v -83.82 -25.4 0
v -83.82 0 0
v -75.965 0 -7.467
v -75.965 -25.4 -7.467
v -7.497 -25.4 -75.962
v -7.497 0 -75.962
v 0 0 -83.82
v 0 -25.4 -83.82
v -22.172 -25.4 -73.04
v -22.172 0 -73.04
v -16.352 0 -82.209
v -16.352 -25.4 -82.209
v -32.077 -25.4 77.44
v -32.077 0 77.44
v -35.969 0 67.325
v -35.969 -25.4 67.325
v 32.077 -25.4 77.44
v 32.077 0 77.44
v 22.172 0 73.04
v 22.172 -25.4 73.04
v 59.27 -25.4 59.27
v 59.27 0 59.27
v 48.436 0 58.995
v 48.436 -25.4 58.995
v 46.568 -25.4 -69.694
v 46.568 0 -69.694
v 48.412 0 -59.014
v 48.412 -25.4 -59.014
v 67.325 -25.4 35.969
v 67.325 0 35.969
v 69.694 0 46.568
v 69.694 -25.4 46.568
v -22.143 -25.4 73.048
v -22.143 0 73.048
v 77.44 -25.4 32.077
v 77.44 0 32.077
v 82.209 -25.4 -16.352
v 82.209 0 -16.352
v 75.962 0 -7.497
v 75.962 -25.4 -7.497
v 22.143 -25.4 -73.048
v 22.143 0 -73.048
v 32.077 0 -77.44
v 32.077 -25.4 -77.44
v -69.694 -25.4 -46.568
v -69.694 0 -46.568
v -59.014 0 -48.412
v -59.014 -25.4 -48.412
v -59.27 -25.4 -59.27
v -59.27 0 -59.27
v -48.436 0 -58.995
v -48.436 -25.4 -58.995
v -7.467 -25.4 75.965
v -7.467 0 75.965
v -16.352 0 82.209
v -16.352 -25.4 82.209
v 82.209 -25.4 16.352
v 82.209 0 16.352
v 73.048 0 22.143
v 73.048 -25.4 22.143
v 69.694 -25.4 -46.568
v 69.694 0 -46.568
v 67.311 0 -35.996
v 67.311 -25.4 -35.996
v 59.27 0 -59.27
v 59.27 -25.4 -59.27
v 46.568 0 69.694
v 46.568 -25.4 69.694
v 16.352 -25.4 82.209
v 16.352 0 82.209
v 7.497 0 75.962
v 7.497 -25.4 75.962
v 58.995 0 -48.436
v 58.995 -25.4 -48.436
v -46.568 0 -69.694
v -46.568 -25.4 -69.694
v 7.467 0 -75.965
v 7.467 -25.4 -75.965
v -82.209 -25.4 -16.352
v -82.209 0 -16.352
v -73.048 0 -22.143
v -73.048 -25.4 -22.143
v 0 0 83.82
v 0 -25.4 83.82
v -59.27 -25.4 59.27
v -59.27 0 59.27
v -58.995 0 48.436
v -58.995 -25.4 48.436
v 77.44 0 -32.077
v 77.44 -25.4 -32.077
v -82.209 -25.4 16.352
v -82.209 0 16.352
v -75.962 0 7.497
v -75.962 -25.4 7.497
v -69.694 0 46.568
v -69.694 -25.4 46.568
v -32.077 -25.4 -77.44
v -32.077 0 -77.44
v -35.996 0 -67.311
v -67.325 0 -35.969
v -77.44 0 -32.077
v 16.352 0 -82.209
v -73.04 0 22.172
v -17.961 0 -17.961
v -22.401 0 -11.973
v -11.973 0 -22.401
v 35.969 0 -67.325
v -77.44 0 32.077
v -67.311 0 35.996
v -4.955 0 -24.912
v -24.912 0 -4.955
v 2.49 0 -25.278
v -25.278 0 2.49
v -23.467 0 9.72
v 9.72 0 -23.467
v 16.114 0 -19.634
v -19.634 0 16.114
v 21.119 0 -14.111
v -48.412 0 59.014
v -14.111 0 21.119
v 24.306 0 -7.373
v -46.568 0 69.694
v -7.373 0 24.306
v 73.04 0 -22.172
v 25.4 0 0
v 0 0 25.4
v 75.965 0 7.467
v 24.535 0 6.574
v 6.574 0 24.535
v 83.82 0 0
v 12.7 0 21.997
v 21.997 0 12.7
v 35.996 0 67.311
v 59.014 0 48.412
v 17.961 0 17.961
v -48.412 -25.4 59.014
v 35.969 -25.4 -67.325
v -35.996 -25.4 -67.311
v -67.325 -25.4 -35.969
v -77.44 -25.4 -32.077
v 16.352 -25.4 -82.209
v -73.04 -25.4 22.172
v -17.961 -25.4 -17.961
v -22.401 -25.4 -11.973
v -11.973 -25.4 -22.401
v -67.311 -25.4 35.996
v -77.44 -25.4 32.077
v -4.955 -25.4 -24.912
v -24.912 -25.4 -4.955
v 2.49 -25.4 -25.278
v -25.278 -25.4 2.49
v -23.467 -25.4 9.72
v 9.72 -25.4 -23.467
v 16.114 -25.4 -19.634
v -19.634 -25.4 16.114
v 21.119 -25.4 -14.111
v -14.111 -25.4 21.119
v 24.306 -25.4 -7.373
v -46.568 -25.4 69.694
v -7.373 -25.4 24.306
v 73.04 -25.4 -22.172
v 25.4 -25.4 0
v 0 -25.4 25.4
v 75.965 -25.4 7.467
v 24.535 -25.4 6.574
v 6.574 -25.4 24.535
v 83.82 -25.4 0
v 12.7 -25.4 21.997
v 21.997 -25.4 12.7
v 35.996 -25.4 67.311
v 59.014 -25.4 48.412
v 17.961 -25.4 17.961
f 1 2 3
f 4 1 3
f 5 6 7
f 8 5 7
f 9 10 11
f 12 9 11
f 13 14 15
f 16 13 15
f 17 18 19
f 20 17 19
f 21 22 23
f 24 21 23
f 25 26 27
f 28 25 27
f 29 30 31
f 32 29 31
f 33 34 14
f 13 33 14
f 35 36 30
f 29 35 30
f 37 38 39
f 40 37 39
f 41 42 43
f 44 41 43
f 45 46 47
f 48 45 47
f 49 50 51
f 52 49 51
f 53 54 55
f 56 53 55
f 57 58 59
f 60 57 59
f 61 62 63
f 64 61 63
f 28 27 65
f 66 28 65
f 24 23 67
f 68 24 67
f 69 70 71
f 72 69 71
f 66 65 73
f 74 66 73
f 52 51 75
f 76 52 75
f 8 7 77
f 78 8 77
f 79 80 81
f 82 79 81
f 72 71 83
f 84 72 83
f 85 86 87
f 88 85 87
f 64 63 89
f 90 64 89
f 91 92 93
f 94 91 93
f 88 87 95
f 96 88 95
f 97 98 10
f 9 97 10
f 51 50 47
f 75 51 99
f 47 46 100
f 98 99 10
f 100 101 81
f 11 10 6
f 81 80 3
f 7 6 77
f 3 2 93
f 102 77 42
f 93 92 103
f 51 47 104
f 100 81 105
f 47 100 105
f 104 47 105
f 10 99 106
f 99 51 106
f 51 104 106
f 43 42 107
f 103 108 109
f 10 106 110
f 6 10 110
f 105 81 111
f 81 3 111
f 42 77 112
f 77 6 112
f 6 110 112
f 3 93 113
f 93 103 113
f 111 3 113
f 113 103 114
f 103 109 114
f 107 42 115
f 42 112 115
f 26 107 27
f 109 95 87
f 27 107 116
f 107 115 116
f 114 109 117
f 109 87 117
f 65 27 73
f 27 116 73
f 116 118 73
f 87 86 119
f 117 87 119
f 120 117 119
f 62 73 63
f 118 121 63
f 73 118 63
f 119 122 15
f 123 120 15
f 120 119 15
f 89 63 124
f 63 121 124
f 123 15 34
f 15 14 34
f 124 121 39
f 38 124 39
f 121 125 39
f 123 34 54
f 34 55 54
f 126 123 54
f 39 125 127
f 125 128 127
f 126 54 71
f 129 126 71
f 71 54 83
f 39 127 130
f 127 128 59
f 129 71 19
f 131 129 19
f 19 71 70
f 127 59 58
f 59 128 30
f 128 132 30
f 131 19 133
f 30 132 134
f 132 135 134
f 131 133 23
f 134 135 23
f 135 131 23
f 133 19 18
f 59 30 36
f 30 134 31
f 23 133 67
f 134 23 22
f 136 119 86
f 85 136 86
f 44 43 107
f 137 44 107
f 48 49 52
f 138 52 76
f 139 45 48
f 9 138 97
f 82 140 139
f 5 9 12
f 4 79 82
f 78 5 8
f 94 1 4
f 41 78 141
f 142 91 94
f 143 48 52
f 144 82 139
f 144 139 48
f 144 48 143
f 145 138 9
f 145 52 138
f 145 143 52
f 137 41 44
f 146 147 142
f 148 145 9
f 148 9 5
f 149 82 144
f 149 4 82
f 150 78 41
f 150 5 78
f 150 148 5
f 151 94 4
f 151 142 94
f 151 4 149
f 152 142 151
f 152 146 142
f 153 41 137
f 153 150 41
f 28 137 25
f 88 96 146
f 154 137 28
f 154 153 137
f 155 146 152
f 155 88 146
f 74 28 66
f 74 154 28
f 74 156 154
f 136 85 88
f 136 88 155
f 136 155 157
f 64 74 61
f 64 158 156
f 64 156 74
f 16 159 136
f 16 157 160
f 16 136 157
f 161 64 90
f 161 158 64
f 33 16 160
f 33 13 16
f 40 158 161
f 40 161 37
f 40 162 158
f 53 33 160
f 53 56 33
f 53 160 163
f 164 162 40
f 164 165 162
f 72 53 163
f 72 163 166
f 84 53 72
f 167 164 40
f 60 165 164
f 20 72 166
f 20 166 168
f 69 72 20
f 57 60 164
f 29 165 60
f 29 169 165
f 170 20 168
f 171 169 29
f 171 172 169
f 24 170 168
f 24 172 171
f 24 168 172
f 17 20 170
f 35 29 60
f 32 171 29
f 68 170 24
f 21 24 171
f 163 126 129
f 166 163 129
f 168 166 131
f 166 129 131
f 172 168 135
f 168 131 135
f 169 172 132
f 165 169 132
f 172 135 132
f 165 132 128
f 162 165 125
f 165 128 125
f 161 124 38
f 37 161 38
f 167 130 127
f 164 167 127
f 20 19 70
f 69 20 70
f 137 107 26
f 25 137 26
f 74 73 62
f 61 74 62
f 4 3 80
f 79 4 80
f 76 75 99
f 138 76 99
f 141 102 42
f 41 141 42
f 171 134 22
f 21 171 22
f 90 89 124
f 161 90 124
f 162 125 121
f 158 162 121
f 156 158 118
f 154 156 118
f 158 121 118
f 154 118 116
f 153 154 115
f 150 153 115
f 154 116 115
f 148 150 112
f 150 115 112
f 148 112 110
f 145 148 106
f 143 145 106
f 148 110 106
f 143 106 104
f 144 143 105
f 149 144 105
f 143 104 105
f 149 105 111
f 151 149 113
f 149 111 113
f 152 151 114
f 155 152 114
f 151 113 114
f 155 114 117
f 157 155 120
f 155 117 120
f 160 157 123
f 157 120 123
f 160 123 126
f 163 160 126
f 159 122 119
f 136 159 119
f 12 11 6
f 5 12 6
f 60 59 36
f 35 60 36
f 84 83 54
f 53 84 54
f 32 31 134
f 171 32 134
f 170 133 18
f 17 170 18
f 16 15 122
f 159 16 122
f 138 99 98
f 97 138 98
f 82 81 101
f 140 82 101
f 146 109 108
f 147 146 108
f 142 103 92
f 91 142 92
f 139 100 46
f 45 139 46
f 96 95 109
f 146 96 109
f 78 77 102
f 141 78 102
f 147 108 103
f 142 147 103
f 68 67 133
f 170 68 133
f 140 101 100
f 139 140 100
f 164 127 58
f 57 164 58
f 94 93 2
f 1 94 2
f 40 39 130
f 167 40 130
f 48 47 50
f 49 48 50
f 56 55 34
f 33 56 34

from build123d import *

# Parameters (mm, degrees)
F1_DEPTH = 25.4
F2_DEPTH = 25.4


with BuildPart() as f1:
    # F0 (on Front) → F1 (new body)
    with BuildSketch(Plane.XZ):
        with BuildLine():
            ThreePointArc((75.8463119216, -7.333278114), (76.1115266186, -3.6709012229), (76.2, 0))
            ThreePointArc((76.2, 0), (76.1122749967, 3.6553515317), (75.8493019732, 7.3022866401))
            ThreePointArc((75.8493019732, 7.3022866401), (75.8346004903, 7.4534132101), (75.8195978942, 7.6045101852))
            ThreePointArc((75.8195978942, 7.6045101852), (74.7388739127, 14.8506136664), (72.9672734521, 21.9594399966))
            ThreePointArc((72.9672734521, 21.9594399966), (72.9233711228, 22.1047945949), (72.87917924, 22.2500614226))
            ThreePointArc((72.87917924, 22.2500614226), (70.4055764051, 29.1460942677), (67.2811535328, 35.7727043889))
            ThreePointArc((67.2811535328, 35.7727043889), (67.209737499, 35.9067011198), (67.1380545986, 36.0405552776))
            ThreePointArc((67.1380545986, 36.0405552776), (63.3666320803, 42.3215068116), (59.0094566149, 48.2112438132))
            ThreePointArc((59.0094566149, 48.2112438132), (58.9132713548, 48.3287332575), (58.8168521705, 48.446030805))
            ThreePointArc((58.8168521705, 48.446030805), (53.892543621, 53.8705275829), (48.4700593721, 58.7970521749))
            ThreePointArc((48.4700593721, 58.7970521749), (48.3528012314, 58.8935192791), (48.2353510983, 58.9897525374))
            ThreePointArc((48.2353510983, 58.9897525374), (42.3473949336, 63.3493341902), (36.0679849301, 67.1233227953))
            ThreePointArc((36.0679849301, 67.1233227953), (35.9341600732, 67.1950603827), (35.8001925341, 67.2665311616))
            ThreePointArc((35.8001925341, 67.2665311616), (29.1748596076, 70.3936614112), (22.2798380543, 72.8700817639))
            ThreePointArc((22.2798380543, 72.8700817639), (22.1345892955, 72.9143329992), (21.9892526478, 72.9582947168))
            ThreePointArc((21.9892526478, 72.9582947168), (14.8811507884, 74.7327997014), (7.6354894968, 75.8164843563))
            ThreePointArc((7.6354894968, 75.8164843563), (7.4843986644, 75.8315486894), (7.333278114, 75.8463119216))
            ThreePointArc((7.333278114, 75.8463119216), (3.6709012229, 76.1115266186), (0, 76.2))
            ThreePointArc((0, 76.2), (-3.6553515317, 76.1122749967), (-7.3022866401, 75.8493019732))
            ThreePointArc((-7.3022866401, 75.8493019732), (-7.4534132101, 75.8346004903), (-7.6045101852, 75.8195978942))
            ThreePointArc((-7.6045101852, 75.8195978942), (-14.8506136664, 74.7388739127), (-21.9594399966, 72.9672734521))
            ThreePointArc((-21.9594399966, 72.9672734521), (-22.1047945949, 72.9233711228), (-22.2500614226, 72.87917924))
            ThreePointArc((-22.2500614226, 72.87917924), (-29.1460942677, 70.4055764051), (-35.7727043889, 67.2811535328))
            ThreePointArc((-35.7727043889, 67.2811535328), (-35.9067011198, 67.209737499), (-36.0405552776, 67.1380545986))
            ThreePointArc((-36.0405552776, 67.1380545986), (-42.3215068116, 63.3666320803), (-48.2112438132, 59.0094566149))
            ThreePointArc((-48.2112438132, 59.0094566149), (-48.3287332575, 58.9132713548), (-48.446030805, 58.8168521705))
            ThreePointArc((-48.446030805, 58.8168521705), (-53.8705275829, 53.892543621), (-58.7970521749, 48.4700593721))
            ThreePointArc((-58.7970521749, 48.4700593721), (-58.8935192791, 48.3528012314), (-58.9897525374, 48.2353510983))
            ThreePointArc((-58.9897525374, 48.2353510983), (-63.3493341902, 42.3473949336), (-67.1233227953, 36.0679849301))
            ThreePointArc((-67.1233227953, 36.0679849301), (-67.1950603827, 35.9341600732), (-67.2665311616, 35.8001925341))
            ThreePointArc((-67.2665311616, 35.8001925341), (-70.3936614112, 29.1748596076), (-72.8700817639, 22.2798380543))
            ThreePointArc((-72.8700817639, 22.2798380543), (-72.9143329992, 22.1345892955), (-72.9582947168, 21.9892526478))
            ThreePointArc((-72.9582947168, 21.9892526478), (-74.7327997014, 14.8811507884), (-75.8164843563, 7.6354894968))
            ThreePointArc((-75.8164843563, 7.6354894968), (-75.8315486894, 7.4843986644), (-75.8463119216, 7.333278114))
            ThreePointArc((-75.8463119216, 7.333278114), (-76.1999984098, 0.0155676898), (-75.8493019732, -7.3022866401))
            ThreePointArc((-75.8493019732, -7.3022866401), (-75.8346004903, -7.4534132101), (-75.8195978942, -7.6045101852))
            ThreePointArc((-75.8195978942, -7.6045101852), (-74.7388739127, -14.8506136664), (-72.9672734521, -21.9594399966))
            ThreePointArc((-72.9672734521, -21.9594399966), (-72.9233711228, -22.1047945949), (-72.87917924, -22.2500614226))
            ThreePointArc((-72.87917924, -22.2500614226), (-70.4055764051, -29.1460942677), (-67.2811535328, -35.7727043889))
            ThreePointArc((-67.2811535328, -35.7727043889), (-67.209737499, -35.9067011198), (-67.1380545986, -36.0405552776))
            ThreePointArc((-67.1380545986, -36.0405552776), (-63.3666320803, -42.3215068116), (-59.0094566149, -48.2112438132))
            ThreePointArc((-59.0094566149, -48.2112438132), (-58.9132713548, -48.3287332575), (-58.8168521705, -48.446030805))
            ThreePointArc((-58.8168521705, -48.446030805), (-53.892543621, -53.8705275829), (-48.4700593721, -58.7970521749))
            ThreePointArc((-48.4700593721, -58.7970521749), (-48.3528012314, -58.8935192791), (-48.2353510983, -58.9897525374))
            ThreePointArc((-48.2353510983, -58.9897525374), (-42.3473949336, -63.3493341902), (-36.0679849301, -67.1233227953))
            ThreePointArc((-36.0679849301, -67.1233227953), (-35.9341600732, -67.1950603827), (-35.8001925341, -67.2665311616))
            ThreePointArc((-35.8001925341, -67.2665311616), (-29.1748596076, -70.3936614112), (-22.2798380543, -72.8700817639))
            ThreePointArc((-22.2798380543, -72.8700817639), (-22.1345892955, -72.9143329992), (-21.9892526478, -72.9582947168))
            ThreePointArc((-21.9892526478, -72.9582947168), (-14.8811507884, -74.7327997014), (-7.6354894968, -75.8164843563))
            ThreePointArc((-7.6354894968, -75.8164843563), (-7.4843986644, -75.8315486894), (-7.333278114, -75.8463119216))
            ThreePointArc((-7.333278114, -75.8463119216), (-0.0155676898, -76.1999984098), (7.3022866401, -75.8493019732))
            ThreePointArc((7.3022866401, -75.8493019732), (7.4534132101, -75.8346004903), (7.6045101852, -75.8195978942))
            ThreePointArc((7.6045101852, -75.8195978942), (14.8506136664, -74.7388739127), (21.9594399966, -72.9672734521))
            ThreePointArc((21.9594399966, -72.9672734521), (22.1047945949, -72.9233711228), (22.2500614226, -72.87917924))
            ThreePointArc((22.2500614226, -72.87917924), (29.1460942677, -70.4055764051), (35.7727043889, -67.2811535328))
            ThreePointArc((35.7727043889, -67.2811535328), (35.9067011198, -67.209737499), (36.0405552776, -67.1380545986))
            ThreePointArc((36.0405552776, -67.1380545986), (42.3215068116, -63.3666320803), (48.2112438132, -59.0094566149))
            ThreePointArc((48.2112438132, -59.0094566149), (48.3287332575, -58.9132713548), (48.446030805, -58.8168521705))
            ThreePointArc((48.446030805, -58.8168521705), (53.8705275829, -53.892543621), (58.7970521749, -48.4700593721))
            ThreePointArc((58.7970521749, -48.4700593721), (58.8935192791, -48.3528012314), (58.9897525374, -48.2353510983))
            ThreePointArc((58.9897525374, -48.2353510983), (63.3493341902, -42.3473949336), (67.1233227953, -36.0679849301))
            ThreePointArc((67.1233227953, -36.0679849301), (67.1950603827, -35.9341600732), (67.2665311616, -35.8001925341))
            ThreePointArc((67.2665311616, -35.8001925341), (70.3936614112, -29.1748596076), (72.8700817639, -22.2798380543))
            ThreePointArc((72.8700817639, -22.2798380543), (72.9143329992, -22.1345892955), (72.9582947168, -21.9892526478))
            ThreePointArc((72.9582947168, -21.9892526478), (74.7327997014, -14.8811507884), (75.8164843563, -7.6354894968))
            ThreePointArc((75.8164843563, -7.6354894968), (75.8315486894, -7.4843986644), (75.8463119216, -7.333278114))
        make_face()
        with BuildLine():
            ThreePointArc((25.4, 0), (-17.9605122421, -17.9605122421), (0, 25.4))
            ThreePointArc((0, 25.4), (17.9605122421, 17.9605122421), (25.4, 0))
        make_face(mode=Mode.SUBTRACT)
    extrude(amount=F1_DEPTH)

    # F0 (on Front) → F2 (join)
    with BuildSketch(Plane.XZ):
        with BuildLine():
            ThreePointArc((75.8493019732, 7.3022866401), (76.1122749967, 3.6553515317), (76.2, 0))
            ThreePointArc((76.2, 0), (76.1115266186, -3.6709012229), (75.8463119216, -7.333278114))
            Line((75.8463119216, -7.333278114), (75.9617505843, -7.4969030545))
            Line((75.9617505843, -7.4969030545), (83.82, 0))
            Line((83.82, 0), (75.9647400778, 7.4665502179))
            Line((75.9647400778, 7.4665502179), (75.8493019732, 7.3022866401))
        make_face()
        with BuildLine():
            ThreePointArc((75.8195978942, 7.6045101852), (75.8346004903, 7.4534132101), (75.8493019732, 7.3022866401))
            Line((75.8493019732, 7.3022866401), (75.9647400778, 7.4665502179))
            Line((75.9647400778, 7.4665502179), (75.8195978942, 7.6045101852))
        make_face()
        with BuildLine():
            Line((75.9617505843, -7.4969030545), (75.8463119216, -7.333278114))
            ThreePointArc((75.8463119216, -7.333278114), (75.8315486894, -7.4843986644), (75.8164843563, -7.6354894968))
            Line((75.8164843563, -7.6354894968), (75.9617505843, -7.4969030545))
        make_face()
        with BuildLine():
            ThreePointArc((72.9672734521, 21.9594399966), (74.7388739127, 14.8506136664), (75.8195978942, 7.6045101852))
            Line((75.8195978942, 7.6045101852), (75.9647400778, 7.4665502179))
            Line((75.9647400778, 7.4665502179), (82.2094222034, 16.3524707914))
            Line((82.2094222034, 16.3524707914), (73.0484472116, 22.1430681527))
            Line((73.0484472116, 22.1430681527), (72.9672734521, 21.9594399966))
        make_face()
        with BuildLine():
            Line((75.9617505843, -7.4969030545), (75.8164843563, -7.6354894968))
            ThreePointArc((75.8164843563, -7.6354894968), (74.7327997014, -14.8811507884), (72.9582947168, -21.9892526478))
            Line((72.9582947168, -21.9892526478), (73.0395936157, -22.1722545469))
            Line((73.0395936157, -22.1722545469), (82.2094222034, -16.3524707914))
            Line((82.2094222034, -16.3524707914), (75.9617505843, -7.4969030545))
        make_face()
        with BuildLine():
            ThreePointArc((72.87917924, 22.2500614226), (72.9233711228, 22.1047945949), (72.9672734521, 21.9594399966))
            Line((72.9672734521, 21.9594399966), (73.0484472116, 22.1430681527))
            Line((73.0484472116, 22.1430681527), (72.87917924, 22.2500614226))
        make_face()
        with BuildLine():
            Line((73.0395936157, -22.1722545469), (72.9582947168, -21.9892526478))
            ThreePointArc((72.9582947168, -21.9892526478), (72.9143329992, -22.1345892955), (72.8700817639, -22.2798380543))
            Line((72.8700817639, -22.2798380543), (73.0395936157, -22.1722545469))
        make_face()
        with BuildLine():
            ThreePointArc((67.2811535328, 35.7727043889), (70.4055764051, 29.1460942677), (72.87917924, 22.2500614226))
            Line((72.87917924, 22.2500614226), (73.0484472116, 22.1430681527))
            Line((73.0484472116, 22.1430681527), (77.4395824151, 32.0765253008))
            Line((77.4395824151, 32.0765253008), (67.3249434851, 35.9686403965))
            Line((67.3249434851, 35.9686403965), (67.2811535328, 35.7727043889))
        make_face()
        with BuildLine():
            Line((73.0395936157, -22.1722545469), (72.8700817639, -22.2798380543))
            ThreePointArc((72.8700817639, -22.2798380543), (70.3936614112, -29.1748596076), (67.2665311616, -35.8001925341))
            Line((67.2665311616, -35.8001925341), (67.3105660255, -35.9955387314))
            Line((67.3105660255, -35.9955387314), (77.4395824151, -32.0765253008))
            Line((77.4395824151, -32.0765253008), (73.0395936157, -22.1722545469))
        make_face()
        with BuildLine():
            ThreePointArc((67.1380545986, 36.0405552776), (67.209737499, 35.9067011198), (67.2811535328, 35.7727043889))
            Line((67.2811535328, 35.7727043889), (67.3249434851, 35.9686403965))
            Line((67.3249434851, 35.9686403965), (67.1380545986, 36.0405552776))
        make_face()
        with BuildLine():
            Line((67.3105660255, -35.9955387314), (67.2665311616, -35.8001925341))
            ThreePointArc((67.2665311616, -35.8001925341), (67.1950603827, -35.9341600732), (67.1233227953, -36.0679849301))
            Line((67.1233227953, -36.0679849301), (67.3105660255, -35.9955387314))
        make_face()
        with BuildLine():
            ThreePointArc((59.0094566149, 48.2112438132), (63.3666320803, 42.3215068116), (67.1380545986, 36.0405552776))
            Line((67.1380545986, 36.0405552776), (67.3249434851, 35.9686403965))
            Line((67.3249434851, 35.9686403965), (69.6937829032, 46.5678969317))
            Line((69.6937829032, 46.5678969317), (59.0141799367, 48.4119579612))
            Line((59.0141799367, 48.4119579612), (59.0094566149, 48.2112438132))
        make_face()
        with BuildLine():
            Line((67.3105660255, -35.9955387314), (67.1233227953, -36.0679849301))
            ThreePointArc((67.1233227953, -36.0679849301), (63.3493341902, -42.3473949336), (58.9897525374, -48.2353510983))
            Line((58.9897525374, -48.2353510983), (58.9948311312, -48.4355345489))
            Line((58.9948311312, -48.4355345489), (69.6937829032, -46.5678969317))
            Line((69.6937829032, -46.5678969317), (67.3105660255, -35.9955387314))
        make_face()
        with BuildLine():
            ThreePointArc((58.8168521705, 48.446030805), (58.9132713548, 48.3287332575), (59.0094566149, 48.2112438132))
            Line((59.0094566149, 48.2112438132), (59.0141799367, 48.4119579612))
            Line((59.0141799367, 48.4119579612), (58.8168521705, 48.446030805))
        make_face()
        with BuildLine():
            Line((58.9948311312, -48.4355345489), (58.9897525374, -48.2353510983))
            ThreePointArc((58.9897525374, -48.2353510983), (58.8935192791, -48.3528012314), (58.7970521749, -48.4700593721))
            Line((58.7970521749, -48.4700593721), (58.9948311312, -48.4355345489))
        make_face()
        with BuildLine():
            ThreePointArc((48.4700593721, 58.7970521749), (53.892543621, 53.8705275829), (58.8168521705, 48.446030805))
            Line((58.8168521705, 48.446030805), (59.0141799367, 48.4119579612))
            Line((59.0141799367, 48.4119579612), (59.2696903991, 59.2696903991))
            Line((59.2696903991, 59.2696903991), (48.4355345489, 58.9948311312))
            Line((48.4355345489, 58.9948311312), (48.4700593721, 58.7970521749))
        make_face()
        with BuildLine():
            Line((58.9948311312, -48.4355345489), (58.7970521749, -48.4700593721))
            ThreePointArc((58.7970521749, -48.4700593721), (53.8705275829, -53.892543621), (48.446030805, -58.8168521705))
            Line((48.446030805, -58.8168521705), (48.4119579612, -59.0141799367))
            Line((48.4119579612, -59.0141799367), (59.2696903991, -59.2696903991))
            Line((59.2696903991, -59.2696903991), (58.9948311312, -48.4355345489))
        make_face()
        with BuildLine():
            ThreePointArc((48.2353510983, 58.9897525374), (48.3528012314, 58.8935192791), (48.4700593721, 58.7970521749))
            Line((48.4700593721, 58.7970521749), (48.4355345489, 58.9948311312))
            Line((48.4355345489, 58.9948311312), (48.2353510983, 58.9897525374))
        make_face()
        with BuildLine():
            Line((48.4119579612, -59.0141799367), (48.446030805, -58.8168521705))
            ThreePointArc((48.446030805, -58.8168521705), (48.3287332575, -58.9132713548), (48.2112438132, -59.0094566149))
            Line((48.2112438132, -59.0094566149), (48.4119579612, -59.0141799367))
        make_face()
        with BuildLine():
            ThreePointArc((36.0679849301, 67.1233227953), (42.3473949336, 63.3493341902), (48.2353510983, 58.9897525374))
            Line((48.2353510983, 58.9897525374), (48.4355345489, 58.9948311312))
            Line((48.4355345489, 58.9948311312), (46.5678969317, 69.6937829032))
            Line((46.5678969317, 69.6937829032), (35.9955387314, 67.3105660255))
            Line((35.9955387314, 67.3105660255), (36.0679849301, 67.1233227953))
        make_face()
        with BuildLine():
            Line((48.4119579612, -59.0141799367), (48.2112438132, -59.0094566149))
            ThreePointArc((48.2112438132, -59.0094566149), (42.3215068116, -63.3666320803), (36.0405552776, -67.1380545986))
            Line((36.0405552776, -67.1380545986), (35.9686403965, -67.3249434851))
            Line((35.9686403965, -67.3249434851), (46.5678969317, -69.6937829032))
            Line((46.5678969317, -69.6937829032), (48.4119579612, -59.0141799367))
        make_face()
        with BuildLine():
            ThreePointArc((35.8001925341, 67.2665311616), (35.9341600732, 67.1950603827), (36.0679849301, 67.1233227953))
            Line((36.0679849301, 67.1233227953), (35.9955387314, 67.3105660255))
            Line((35.9955387314, 67.3105660255), (35.8001925341, 67.2665311616))
        make_face()
        with BuildLine():
            Line((35.9686403965, -67.3249434851), (36.0405552776, -67.1380545986))
            ThreePointArc((36.0405552776, -67.1380545986), (35.9067011198, -67.209737499), (35.7727043889, -67.2811535328))
            Line((35.7727043889, -67.2811535328), (35.9686403965, -67.3249434851))
        make_face()
        with BuildLine():
            ThreePointArc((22.2798380543, 72.8700817639), (29.1748596076, 70.3936614112), (35.8001925341, 67.2665311616))
            Line((35.8001925341, 67.2665311616), (35.9955387314, 67.3105660255))
            Line((35.9955387314, 67.3105660255), (32.0765253008, 77.4395824151))
            Line((32.0765253008, 77.4395824151), (22.1722545469, 73.0395936157))
            Line((22.1722545469, 73.0395936157), (22.2798380543, 72.8700817639))
        make_face()
        with BuildLine():
            Line((35.9686403965, -67.3249434851), (35.7727043889, -67.2811535328))
            ThreePointArc((35.7727043889, -67.2811535328), (29.1460942677, -70.4055764051), (22.2500614226, -72.87917924))
            Line((22.2500614226, -72.87917924), (22.1430681527, -73.0484472116))
            Line((22.1430681527, -73.0484472116), (32.0765253008, -77.4395824151))
            Line((32.0765253008, -77.4395824151), (35.9686403965, -67.3249434851))
        make_face()
        with BuildLine():
            ThreePointArc((21.9892526478, 72.9582947168), (22.1345892955, 72.9143329992), (22.2798380543, 72.8700817639))
            Line((22.2798380543, 72.8700817639), (22.1722545469, 73.0395936157))
            Line((22.1722545469, 73.0395936157), (21.9892526478, 72.9582947168))
        make_face()
        with BuildLine():
            Line((22.1430681527, -73.0484472116), (22.2500614226, -72.87917924))
            ThreePointArc((22.2500614226, -72.87917924), (22.1047945949, -72.9233711228), (21.9594399966, -72.9672734521))
            Line((21.9594399966, -72.9672734521), (22.1430681527, -73.0484472116))
        make_face()
        with BuildLine():
            ThreePointArc((7.6354894968, 75.8164843563), (14.8811507884, 74.7327997014), (21.9892526478, 72.9582947168))
            Line((21.9892526478, 72.9582947168), (22.1722545469, 73.0395936157))
            Line((22.1722545469, 73.0395936157), (16.3524707914, 82.2094222034))
            Line((16.3524707914, 82.2094222034), (7.4969030545, 75.9617505843))
            Line((7.4969030545, 75.9617505843), (7.6354894968, 75.8164843563))
        make_face()
        with BuildLine():
            Line((22.1430681527, -73.0484472116), (21.9594399966, -72.9672734521))
            ThreePointArc((21.9594399966, -72.9672734521), (14.8506136664, -74.7388739127), (7.6045101852, -75.8195978942))
            Line((7.6045101852, -75.8195978942), (7.4665502179, -75.9647400778))
            Line((7.4665502179, -75.9647400778), (16.3524707914, -82.2094222034))
            Line((16.3524707914, -82.2094222034), (22.1430681527, -73.0484472116))
        make_face()
        with BuildLine():
            ThreePointArc((7.333278114, 75.8463119216), (7.4843986644, 75.8315486894), (7.6354894968, 75.8164843563))
            Line((7.6354894968, 75.8164843563), (7.4969030545, 75.9617505843))
            Line((7.4969030545, 75.9617505843), (7.333278114, 75.8463119216))
        make_face()
        with BuildLine():
            Line((7.4665502179, -75.9647400778), (7.6045101852, -75.8195978942))
            ThreePointArc((7.6045101852, -75.8195978942), (7.4534132101, -75.8346004903), (7.3022866401, -75.8493019732))
            Line((7.3022866401, -75.8493019732), (7.4665502179, -75.9647400778))
        make_face()
        with BuildLine():
            ThreePointArc((0, 76.2), (3.6709012229, 76.1115266186), (7.333278114, 75.8463119216))
            Line((7.333278114, 75.8463119216), (7.4969030545, 75.9617505843))
            Line((7.4969030545, 75.9617505843), (0, 83.82))
            Line((0, 83.82), (0, 76.2))
        make_face()
        with BuildLine():
            Line((7.4665502179, -75.9647400778), (7.3022866401, -75.8493019732))
            ThreePointArc((7.3022866401, -75.8493019732), (-0.0155676898, -76.1999984098), (-7.333278114, -75.8463119216))
            Line((-7.333278114, -75.8463119216), (-7.4969030545, -75.9617505843))
            Line((-7.4969030545, -75.9617505843), (0, -83.82))
            Line((0, -83.82), (7.4665502179, -75.9647400778))
        make_face()
        with BuildLine():
            ThreePointArc((-7.3022866401, 75.8493019732), (-3.6553515317, 76.1122749967), (0, 76.2))
            Line((0, 76.2), (0, 83.82))
            Line((0, 83.82), (-7.4665502179, 75.9647400778))
            Line((-7.4665502179, 75.9647400778), (-7.3022866401, 75.8493019732))
        make_face()
        with BuildLine():
            Line((-7.4969030545, -75.9617505843), (-7.333278114, -75.8463119216))
            ThreePointArc((-7.333278114, -75.8463119216), (-7.4843986644, -75.8315486894), (-7.6354894968, -75.8164843563))
            Line((-7.6354894968, -75.8164843563), (-7.4969030545, -75.9617505843))
        make_face()
        with BuildLine():
            ThreePointArc((-7.6045101852, 75.8195978942), (-7.4534132101, 75.8346004903), (-7.3022866401, 75.8493019732))
            Line((-7.3022866401, 75.8493019732), (-7.4665502179, 75.9647400778))
            Line((-7.4665502179, 75.9647400778), (-7.6045101852, 75.8195978942))
        make_face()
        with BuildLine():
            Line((-7.6045101852, 75.8195978942), (-7.4665502179, 75.9647400778))
            Line((-7.4665502179, 75.9647400778), (-16.3524707914, 82.2094222034))
            Line((-16.3524707914, 82.2094222034), (-22.1430681527, 73.0484472116))
            Line((-22.1430681527, 73.0484472116), (-21.9594399966, 72.9672734521))
            ThreePointArc((-21.9594399966, 72.9672734521), (-14.8506136664, 74.7388739127), (-7.6045101852, 75.8195978942))
        make_face()
        with BuildLine():
            Line((-7.4969030545, -75.9617505843), (-7.6354894968, -75.8164843563))
            ThreePointArc((-7.6354894968, -75.8164843563), (-14.8811507884, -74.7327997014), (-21.9892526478, -72.9582947168))
            Line((-21.9892526478, -72.9582947168), (-22.1722545469, -73.0395936157))
            Line((-22.1722545469, -73.0395936157), (-16.3524707914, -82.2094222034))
            Line((-16.3524707914, -82.2094222034), (-7.4969030545, -75.9617505843))
        make_face()
        with BuildLine():
            Line((-22.1722545469, -73.0395936157), (-21.9892526478, -72.9582947168))
            ThreePointArc((-21.9892526478, -72.9582947168), (-22.1345892955, -72.9143329992), (-22.2798380543, -72.8700817639))
            Line((-22.2798380543, -72.8700817639), (-22.1722545469, -73.0395936157))
        make_face()
        with BuildLine():
            ThreePointArc((-22.2500614226, 72.87917924), (-22.1047945949, 72.9233711228), (-21.9594399966, 72.9672734521))
            Line((-21.9594399966, 72.9672734521), (-22.1430681527, 73.0484472116))
            Line((-22.1430681527, 73.0484472116), (-22.2500614226, 72.87917924))
        make_face()
        with BuildLine():
            Line((-22.2500614226, 72.87917924), (-22.1430681527, 73.0484472116))
            Line((-22.1430681527, 73.0484472116), (-32.0765253008, 77.4395824151))
            Line((-32.0765253008, 77.4395824151), (-35.9686403965, 67.3249434851))
            Line((-35.9686403965, 67.3249434851), (-35.7727043889, 67.2811535328))
            ThreePointArc((-35.7727043889, 67.2811535328), (-29.1460942677, 70.4055764051), (-22.2500614226, 72.87917924))
        make_face()
        with BuildLine():
            Line((-22.1722545469, -73.0395936157), (-22.2798380543, -72.8700817639))
            ThreePointArc((-22.2798380543, -72.8700817639), (-29.1748596076, -70.3936614112), (-35.8001925341, -67.2665311616))
            Line((-35.8001925341, -67.2665311616), (-35.9955387314, -67.3105660255))
            Line((-35.9955387314, -67.3105660255), (-32.0765253008, -77.4395824151))
            Line((-32.0765253008, -77.4395824151), (-22.1722545469, -73.0395936157))
        make_face()
        with BuildLine():
            Line((-35.9955387314, -67.3105660255), (-35.8001925341, -67.2665311616))
            ThreePointArc((-35.8001925341, -67.2665311616), (-35.9341600732, -67.1950603827), (-36.0679849301, -67.1233227953))
            Line((-36.0679849301, -67.1233227953), (-35.9955387314, -67.3105660255))
        make_face()
        with BuildLine():
            ThreePointArc((-36.0405552776, 67.1380545986), (-35.9067011198, 67.209737499), (-35.7727043889, 67.2811535328))
            Line((-35.7727043889, 67.2811535328), (-35.9686403965, 67.3249434851))
            Line((-35.9686403965, 67.3249434851), (-36.0405552776, 67.1380545986))
        make_face()
        with BuildLine():
            Line((-36.0405552776, 67.1380545986), (-35.9686403965, 67.3249434851))
            Line((-35.9686403965, 67.3249434851), (-46.5678969317, 69.6937829032))
            Line((-46.5678969317, 69.6937829032), (-48.4119579612, 59.0141799367))
            Line((-48.4119579612, 59.0141799367), (-48.2112438132, 59.0094566149))
            ThreePointArc((-48.2112438132, 59.0094566149), (-42.3215068116, 63.3666320803), (-36.0405552776, 67.1380545986))
        make_face()
        with BuildLine():
            Line((-35.9955387314, -67.3105660255), (-36.0679849301, -67.1233227953))
            ThreePointArc((-36.0679849301, -67.1233227953), (-42.3473949336, -63.3493341902), (-48.2353510983, -58.9897525374))
            Line((-48.2353510983, -58.9897525374), (-48.4355345489, -58.9948311312))
            Line((-48.4355345489, -58.9948311312), (-46.5678969317, -69.6937829032))
            Line((-46.5678969317, -69.6937829032), (-35.9955387314, -67.3105660255))
        make_face()
        with BuildLine():
            Line((-48.4355345489, -58.9948311312), (-48.2353510983, -58.9897525374))
            ThreePointArc((-48.2353510983, -58.9897525374), (-48.3528012314, -58.8935192791), (-48.4700593721, -58.7970521749))
            Line((-48.4700593721, -58.7970521749), (-48.4355345489, -58.9948311312))
        make_face()
        with BuildLine():
            ThreePointArc((-48.446030805, 58.8168521705), (-48.3287332575, 58.9132713548), (-48.2112438132, 59.0094566149))
            Line((-48.2112438132, 59.0094566149), (-48.4119579612, 59.0141799367))
            Line((-48.4119579612, 59.0141799367), (-48.446030805, 58.8168521705))
        make_face()
        with BuildLine():
            Line((-48.446030805, 58.8168521705), (-48.4119579612, 59.0141799367))
            Line((-48.4119579612, 59.0141799367), (-59.2696903991, 59.2696903991))
            Line((-59.2696903991, 59.2696903991), (-58.9948311312, 48.4355345489))
            Line((-58.9948311312, 48.4355345489), (-58.7970521749, 48.4700593721))
            ThreePointArc((-58.7970521749, 48.4700593721), (-53.8705275829, 53.892543621), (-48.446030805, 58.8168521705))
        make_face()
        with BuildLine():
            Line((-48.4355345489, -58.9948311312), (-48.4700593721, -58.7970521749))
            ThreePointArc((-48.4700593721, -58.7970521749), (-53.892543621, -53.8705275829), (-58.8168521705, -48.446030805))
            Line((-58.8168521705, -48.446030805), (-59.0141799367, -48.4119579612))
            Line((-59.0141799367, -48.4119579612), (-59.2696903991, -59.2696903991))
            Line((-59.2696903991, -59.2696903991), (-48.4355345489, -58.9948311312))
        make_face()
        with BuildLine():
            Line((-59.0141799367, -48.4119579612), (-58.8168521705, -48.446030805))
            ThreePointArc((-58.8168521705, -48.446030805), (-58.9132713548, -48.3287332575), (-59.0094566149, -48.2112438132))
            Line((-59.0094566149, -48.2112438132), (-59.0141799367, -48.4119579612))
        make_face()
        with BuildLine():
            ThreePointArc((-58.9897525374, 48.2353510983), (-58.8935192791, 48.3528012314), (-58.7970521749, 48.4700593721))
            Line((-58.7970521749, 48.4700593721), (-58.9948311312, 48.4355345489))
            Line((-58.9948311312, 48.4355345489), (-58.9897525374, 48.2353510983))
        make_face()
        with BuildLine():
            Line((-58.9897525374, 48.2353510983), (-58.9948311312, 48.4355345489))
            Line((-58.9948311312, 48.4355345489), (-69.6937829032, 46.5678969317))
            Line((-69.6937829032, 46.5678969317), (-67.3105660255, 35.9955387314))
            Line((-67.3105660255, 35.9955387314), (-67.1233227953, 36.0679849301))
            ThreePointArc((-67.1233227953, 36.0679849301), (-63.3493341902, 42.3473949336), (-58.9897525374, 48.2353510983))
        make_face()
        with BuildLine():
            Line((-59.0141799367, -48.4119579612), (-59.0094566149, -48.2112438132))
            ThreePointArc((-59.0094566149, -48.2112438132), (-63.3666320803, -42.3215068116), (-67.1380545986, -36.0405552776))
            Line((-67.1380545986, -36.0405552776), (-67.3249434851, -35.9686403965))
            Line((-67.3249434851, -35.9686403965), (-69.6937829032, -46.5678969317))
            Line((-69.6937829032, -46.5678969317), (-59.0141799367, -48.4119579612))
        make_face()
        with BuildLine():
            Line((-67.3249434851, -35.9686403965), (-67.1380545986, -36.0405552776))
            ThreePointArc((-67.1380545986, -36.0405552776), (-67.209737499, -35.9067011198), (-67.2811535328, -35.7727043889))
            Line((-67.2811535328, -35.7727043889), (-67.3249434851, -35.9686403965))
        make_face()
        with BuildLine():
            ThreePointArc((-67.2665311616, 35.8001925341), (-67.1950603827, 35.9341600732), (-67.1233227953, 36.0679849301))
            Line((-67.1233227953, 36.0679849301), (-67.3105660255, 35.9955387314))
            Line((-67.3105660255, 35.9955387314), (-67.2665311616, 35.8001925341))
        make_face()
        with BuildLine():
            Line((-67.2665311616, 35.8001925341), (-67.3105660255, 35.9955387314))
            Line((-67.3105660255, 35.9955387314), (-77.4395824151, 32.0765253008))
            Line((-77.4395824151, 32.0765253008), (-73.0395936157, 22.1722545469))
            Line((-73.0395936157, 22.1722545469), (-72.8700817639, 22.2798380543))
            ThreePointArc((-72.8700817639, 22.2798380543), (-70.3936614112, 29.1748596076), (-67.2665311616, 35.8001925341))
        make_face()
        with BuildLine():
            Line((-67.3249434851, -35.9686403965), (-67.2811535328, -35.7727043889))
            ThreePointArc((-67.2811535328, -35.7727043889), (-70.4055764051, -29.1460942677), (-72.87917924, -22.2500614226))
            Line((-72.87917924, -22.2500614226), (-73.0484472116, -22.1430681527))
            Line((-73.0484472116, -22.1430681527), (-77.4395824151, -32.0765253008))
            Line((-77.4395824151, -32.0765253008), (-67.3249434851, -35.9686403965))
        make_face()
        with BuildLine():
            Line((-73.0484472116, -22.1430681527), (-72.87917924, -22.2500614226))
            ThreePointArc((-72.87917924, -22.2500614226), (-72.9233711228, -22.1047945949), (-72.9672734521, -21.9594399966))
            Line((-72.9672734521, -21.9594399966), (-73.0484472116, -22.1430681527))
        make_face()
        with BuildLine():
            ThreePointArc((-72.9582947168, 21.9892526478), (-72.9143329992, 22.1345892955), (-72.8700817639, 22.2798380543))
            Line((-72.8700817639, 22.2798380543), (-73.0395936157, 22.1722545469))
            Line((-73.0395936157, 22.1722545469), (-72.9582947168, 21.9892526478))
        make_face()
        with BuildLine():
            Line((-72.9582947168, 21.9892526478), (-73.0395936157, 22.1722545469))
            Line((-73.0395936157, 22.1722545469), (-82.2094222034, 16.3524707914))
            Line((-82.2094222034, 16.3524707914), (-75.9617505843, 7.4969030545))
            Line((-75.9617505843, 7.4969030545), (-75.8164843563, 7.6354894968))
            ThreePointArc((-75.8164843563, 7.6354894968), (-74.7327997014, 14.8811507884), (-72.9582947168, 21.9892526478))
        make_face()
        with BuildLine():
            Line((-73.0484472116, -22.1430681527), (-72.9672734521, -21.9594399966))
            ThreePointArc((-72.9672734521, -21.9594399966), (-74.7388739127, -14.8506136664), (-75.8195978942, -7.6045101852))
            Line((-75.8195978942, -7.6045101852), (-75.9647400778, -7.4665502179))
            Line((-75.9647400778, -7.4665502179), (-82.2094222034, -16.3524707914))
            Line((-82.2094222034, -16.3524707914), (-73.0484472116, -22.1430681527))
        make_face()
        with BuildLine():
            Line((-75.9647400778, -7.4665502179), (-75.8195978942, -7.6045101852))
            ThreePointArc((-75.8195978942, -7.6045101852), (-75.8346004903, -7.4534132101), (-75.8493019732, -7.3022866401))
            Line((-75.8493019732, -7.3022866401), (-75.9647400778, -7.4665502179))
        make_face()
        with BuildLine():
            ThreePointArc((-75.8463119216, 7.333278114), (-75.8315486894, 7.4843986644), (-75.8164843563, 7.6354894968))
            Line((-75.8164843563, 7.6354894968), (-75.9617505843, 7.4969030545))
            Line((-75.9617505843, 7.4969030545), (-75.8463119216, 7.333278114))
        make_face()
        with BuildLine():
            Line((-75.8463119216, 7.333278114), (-75.9617505843, 7.4969030545))
            Line((-75.9617505843, 7.4969030545), (-83.82, 0))
            Line((-83.82, 0), (-75.9647400778, -7.4665502179))
            Line((-75.9647400778, -7.4665502179), (-75.8493019732, -7.3022866401))
            ThreePointArc((-75.8493019732, -7.3022866401), (-76.1999984098, 0.0155676898), (-75.8463119216, 7.333278114))
        make_face()
    extrude(amount=F2_DEPTH)


solid = f1.part
